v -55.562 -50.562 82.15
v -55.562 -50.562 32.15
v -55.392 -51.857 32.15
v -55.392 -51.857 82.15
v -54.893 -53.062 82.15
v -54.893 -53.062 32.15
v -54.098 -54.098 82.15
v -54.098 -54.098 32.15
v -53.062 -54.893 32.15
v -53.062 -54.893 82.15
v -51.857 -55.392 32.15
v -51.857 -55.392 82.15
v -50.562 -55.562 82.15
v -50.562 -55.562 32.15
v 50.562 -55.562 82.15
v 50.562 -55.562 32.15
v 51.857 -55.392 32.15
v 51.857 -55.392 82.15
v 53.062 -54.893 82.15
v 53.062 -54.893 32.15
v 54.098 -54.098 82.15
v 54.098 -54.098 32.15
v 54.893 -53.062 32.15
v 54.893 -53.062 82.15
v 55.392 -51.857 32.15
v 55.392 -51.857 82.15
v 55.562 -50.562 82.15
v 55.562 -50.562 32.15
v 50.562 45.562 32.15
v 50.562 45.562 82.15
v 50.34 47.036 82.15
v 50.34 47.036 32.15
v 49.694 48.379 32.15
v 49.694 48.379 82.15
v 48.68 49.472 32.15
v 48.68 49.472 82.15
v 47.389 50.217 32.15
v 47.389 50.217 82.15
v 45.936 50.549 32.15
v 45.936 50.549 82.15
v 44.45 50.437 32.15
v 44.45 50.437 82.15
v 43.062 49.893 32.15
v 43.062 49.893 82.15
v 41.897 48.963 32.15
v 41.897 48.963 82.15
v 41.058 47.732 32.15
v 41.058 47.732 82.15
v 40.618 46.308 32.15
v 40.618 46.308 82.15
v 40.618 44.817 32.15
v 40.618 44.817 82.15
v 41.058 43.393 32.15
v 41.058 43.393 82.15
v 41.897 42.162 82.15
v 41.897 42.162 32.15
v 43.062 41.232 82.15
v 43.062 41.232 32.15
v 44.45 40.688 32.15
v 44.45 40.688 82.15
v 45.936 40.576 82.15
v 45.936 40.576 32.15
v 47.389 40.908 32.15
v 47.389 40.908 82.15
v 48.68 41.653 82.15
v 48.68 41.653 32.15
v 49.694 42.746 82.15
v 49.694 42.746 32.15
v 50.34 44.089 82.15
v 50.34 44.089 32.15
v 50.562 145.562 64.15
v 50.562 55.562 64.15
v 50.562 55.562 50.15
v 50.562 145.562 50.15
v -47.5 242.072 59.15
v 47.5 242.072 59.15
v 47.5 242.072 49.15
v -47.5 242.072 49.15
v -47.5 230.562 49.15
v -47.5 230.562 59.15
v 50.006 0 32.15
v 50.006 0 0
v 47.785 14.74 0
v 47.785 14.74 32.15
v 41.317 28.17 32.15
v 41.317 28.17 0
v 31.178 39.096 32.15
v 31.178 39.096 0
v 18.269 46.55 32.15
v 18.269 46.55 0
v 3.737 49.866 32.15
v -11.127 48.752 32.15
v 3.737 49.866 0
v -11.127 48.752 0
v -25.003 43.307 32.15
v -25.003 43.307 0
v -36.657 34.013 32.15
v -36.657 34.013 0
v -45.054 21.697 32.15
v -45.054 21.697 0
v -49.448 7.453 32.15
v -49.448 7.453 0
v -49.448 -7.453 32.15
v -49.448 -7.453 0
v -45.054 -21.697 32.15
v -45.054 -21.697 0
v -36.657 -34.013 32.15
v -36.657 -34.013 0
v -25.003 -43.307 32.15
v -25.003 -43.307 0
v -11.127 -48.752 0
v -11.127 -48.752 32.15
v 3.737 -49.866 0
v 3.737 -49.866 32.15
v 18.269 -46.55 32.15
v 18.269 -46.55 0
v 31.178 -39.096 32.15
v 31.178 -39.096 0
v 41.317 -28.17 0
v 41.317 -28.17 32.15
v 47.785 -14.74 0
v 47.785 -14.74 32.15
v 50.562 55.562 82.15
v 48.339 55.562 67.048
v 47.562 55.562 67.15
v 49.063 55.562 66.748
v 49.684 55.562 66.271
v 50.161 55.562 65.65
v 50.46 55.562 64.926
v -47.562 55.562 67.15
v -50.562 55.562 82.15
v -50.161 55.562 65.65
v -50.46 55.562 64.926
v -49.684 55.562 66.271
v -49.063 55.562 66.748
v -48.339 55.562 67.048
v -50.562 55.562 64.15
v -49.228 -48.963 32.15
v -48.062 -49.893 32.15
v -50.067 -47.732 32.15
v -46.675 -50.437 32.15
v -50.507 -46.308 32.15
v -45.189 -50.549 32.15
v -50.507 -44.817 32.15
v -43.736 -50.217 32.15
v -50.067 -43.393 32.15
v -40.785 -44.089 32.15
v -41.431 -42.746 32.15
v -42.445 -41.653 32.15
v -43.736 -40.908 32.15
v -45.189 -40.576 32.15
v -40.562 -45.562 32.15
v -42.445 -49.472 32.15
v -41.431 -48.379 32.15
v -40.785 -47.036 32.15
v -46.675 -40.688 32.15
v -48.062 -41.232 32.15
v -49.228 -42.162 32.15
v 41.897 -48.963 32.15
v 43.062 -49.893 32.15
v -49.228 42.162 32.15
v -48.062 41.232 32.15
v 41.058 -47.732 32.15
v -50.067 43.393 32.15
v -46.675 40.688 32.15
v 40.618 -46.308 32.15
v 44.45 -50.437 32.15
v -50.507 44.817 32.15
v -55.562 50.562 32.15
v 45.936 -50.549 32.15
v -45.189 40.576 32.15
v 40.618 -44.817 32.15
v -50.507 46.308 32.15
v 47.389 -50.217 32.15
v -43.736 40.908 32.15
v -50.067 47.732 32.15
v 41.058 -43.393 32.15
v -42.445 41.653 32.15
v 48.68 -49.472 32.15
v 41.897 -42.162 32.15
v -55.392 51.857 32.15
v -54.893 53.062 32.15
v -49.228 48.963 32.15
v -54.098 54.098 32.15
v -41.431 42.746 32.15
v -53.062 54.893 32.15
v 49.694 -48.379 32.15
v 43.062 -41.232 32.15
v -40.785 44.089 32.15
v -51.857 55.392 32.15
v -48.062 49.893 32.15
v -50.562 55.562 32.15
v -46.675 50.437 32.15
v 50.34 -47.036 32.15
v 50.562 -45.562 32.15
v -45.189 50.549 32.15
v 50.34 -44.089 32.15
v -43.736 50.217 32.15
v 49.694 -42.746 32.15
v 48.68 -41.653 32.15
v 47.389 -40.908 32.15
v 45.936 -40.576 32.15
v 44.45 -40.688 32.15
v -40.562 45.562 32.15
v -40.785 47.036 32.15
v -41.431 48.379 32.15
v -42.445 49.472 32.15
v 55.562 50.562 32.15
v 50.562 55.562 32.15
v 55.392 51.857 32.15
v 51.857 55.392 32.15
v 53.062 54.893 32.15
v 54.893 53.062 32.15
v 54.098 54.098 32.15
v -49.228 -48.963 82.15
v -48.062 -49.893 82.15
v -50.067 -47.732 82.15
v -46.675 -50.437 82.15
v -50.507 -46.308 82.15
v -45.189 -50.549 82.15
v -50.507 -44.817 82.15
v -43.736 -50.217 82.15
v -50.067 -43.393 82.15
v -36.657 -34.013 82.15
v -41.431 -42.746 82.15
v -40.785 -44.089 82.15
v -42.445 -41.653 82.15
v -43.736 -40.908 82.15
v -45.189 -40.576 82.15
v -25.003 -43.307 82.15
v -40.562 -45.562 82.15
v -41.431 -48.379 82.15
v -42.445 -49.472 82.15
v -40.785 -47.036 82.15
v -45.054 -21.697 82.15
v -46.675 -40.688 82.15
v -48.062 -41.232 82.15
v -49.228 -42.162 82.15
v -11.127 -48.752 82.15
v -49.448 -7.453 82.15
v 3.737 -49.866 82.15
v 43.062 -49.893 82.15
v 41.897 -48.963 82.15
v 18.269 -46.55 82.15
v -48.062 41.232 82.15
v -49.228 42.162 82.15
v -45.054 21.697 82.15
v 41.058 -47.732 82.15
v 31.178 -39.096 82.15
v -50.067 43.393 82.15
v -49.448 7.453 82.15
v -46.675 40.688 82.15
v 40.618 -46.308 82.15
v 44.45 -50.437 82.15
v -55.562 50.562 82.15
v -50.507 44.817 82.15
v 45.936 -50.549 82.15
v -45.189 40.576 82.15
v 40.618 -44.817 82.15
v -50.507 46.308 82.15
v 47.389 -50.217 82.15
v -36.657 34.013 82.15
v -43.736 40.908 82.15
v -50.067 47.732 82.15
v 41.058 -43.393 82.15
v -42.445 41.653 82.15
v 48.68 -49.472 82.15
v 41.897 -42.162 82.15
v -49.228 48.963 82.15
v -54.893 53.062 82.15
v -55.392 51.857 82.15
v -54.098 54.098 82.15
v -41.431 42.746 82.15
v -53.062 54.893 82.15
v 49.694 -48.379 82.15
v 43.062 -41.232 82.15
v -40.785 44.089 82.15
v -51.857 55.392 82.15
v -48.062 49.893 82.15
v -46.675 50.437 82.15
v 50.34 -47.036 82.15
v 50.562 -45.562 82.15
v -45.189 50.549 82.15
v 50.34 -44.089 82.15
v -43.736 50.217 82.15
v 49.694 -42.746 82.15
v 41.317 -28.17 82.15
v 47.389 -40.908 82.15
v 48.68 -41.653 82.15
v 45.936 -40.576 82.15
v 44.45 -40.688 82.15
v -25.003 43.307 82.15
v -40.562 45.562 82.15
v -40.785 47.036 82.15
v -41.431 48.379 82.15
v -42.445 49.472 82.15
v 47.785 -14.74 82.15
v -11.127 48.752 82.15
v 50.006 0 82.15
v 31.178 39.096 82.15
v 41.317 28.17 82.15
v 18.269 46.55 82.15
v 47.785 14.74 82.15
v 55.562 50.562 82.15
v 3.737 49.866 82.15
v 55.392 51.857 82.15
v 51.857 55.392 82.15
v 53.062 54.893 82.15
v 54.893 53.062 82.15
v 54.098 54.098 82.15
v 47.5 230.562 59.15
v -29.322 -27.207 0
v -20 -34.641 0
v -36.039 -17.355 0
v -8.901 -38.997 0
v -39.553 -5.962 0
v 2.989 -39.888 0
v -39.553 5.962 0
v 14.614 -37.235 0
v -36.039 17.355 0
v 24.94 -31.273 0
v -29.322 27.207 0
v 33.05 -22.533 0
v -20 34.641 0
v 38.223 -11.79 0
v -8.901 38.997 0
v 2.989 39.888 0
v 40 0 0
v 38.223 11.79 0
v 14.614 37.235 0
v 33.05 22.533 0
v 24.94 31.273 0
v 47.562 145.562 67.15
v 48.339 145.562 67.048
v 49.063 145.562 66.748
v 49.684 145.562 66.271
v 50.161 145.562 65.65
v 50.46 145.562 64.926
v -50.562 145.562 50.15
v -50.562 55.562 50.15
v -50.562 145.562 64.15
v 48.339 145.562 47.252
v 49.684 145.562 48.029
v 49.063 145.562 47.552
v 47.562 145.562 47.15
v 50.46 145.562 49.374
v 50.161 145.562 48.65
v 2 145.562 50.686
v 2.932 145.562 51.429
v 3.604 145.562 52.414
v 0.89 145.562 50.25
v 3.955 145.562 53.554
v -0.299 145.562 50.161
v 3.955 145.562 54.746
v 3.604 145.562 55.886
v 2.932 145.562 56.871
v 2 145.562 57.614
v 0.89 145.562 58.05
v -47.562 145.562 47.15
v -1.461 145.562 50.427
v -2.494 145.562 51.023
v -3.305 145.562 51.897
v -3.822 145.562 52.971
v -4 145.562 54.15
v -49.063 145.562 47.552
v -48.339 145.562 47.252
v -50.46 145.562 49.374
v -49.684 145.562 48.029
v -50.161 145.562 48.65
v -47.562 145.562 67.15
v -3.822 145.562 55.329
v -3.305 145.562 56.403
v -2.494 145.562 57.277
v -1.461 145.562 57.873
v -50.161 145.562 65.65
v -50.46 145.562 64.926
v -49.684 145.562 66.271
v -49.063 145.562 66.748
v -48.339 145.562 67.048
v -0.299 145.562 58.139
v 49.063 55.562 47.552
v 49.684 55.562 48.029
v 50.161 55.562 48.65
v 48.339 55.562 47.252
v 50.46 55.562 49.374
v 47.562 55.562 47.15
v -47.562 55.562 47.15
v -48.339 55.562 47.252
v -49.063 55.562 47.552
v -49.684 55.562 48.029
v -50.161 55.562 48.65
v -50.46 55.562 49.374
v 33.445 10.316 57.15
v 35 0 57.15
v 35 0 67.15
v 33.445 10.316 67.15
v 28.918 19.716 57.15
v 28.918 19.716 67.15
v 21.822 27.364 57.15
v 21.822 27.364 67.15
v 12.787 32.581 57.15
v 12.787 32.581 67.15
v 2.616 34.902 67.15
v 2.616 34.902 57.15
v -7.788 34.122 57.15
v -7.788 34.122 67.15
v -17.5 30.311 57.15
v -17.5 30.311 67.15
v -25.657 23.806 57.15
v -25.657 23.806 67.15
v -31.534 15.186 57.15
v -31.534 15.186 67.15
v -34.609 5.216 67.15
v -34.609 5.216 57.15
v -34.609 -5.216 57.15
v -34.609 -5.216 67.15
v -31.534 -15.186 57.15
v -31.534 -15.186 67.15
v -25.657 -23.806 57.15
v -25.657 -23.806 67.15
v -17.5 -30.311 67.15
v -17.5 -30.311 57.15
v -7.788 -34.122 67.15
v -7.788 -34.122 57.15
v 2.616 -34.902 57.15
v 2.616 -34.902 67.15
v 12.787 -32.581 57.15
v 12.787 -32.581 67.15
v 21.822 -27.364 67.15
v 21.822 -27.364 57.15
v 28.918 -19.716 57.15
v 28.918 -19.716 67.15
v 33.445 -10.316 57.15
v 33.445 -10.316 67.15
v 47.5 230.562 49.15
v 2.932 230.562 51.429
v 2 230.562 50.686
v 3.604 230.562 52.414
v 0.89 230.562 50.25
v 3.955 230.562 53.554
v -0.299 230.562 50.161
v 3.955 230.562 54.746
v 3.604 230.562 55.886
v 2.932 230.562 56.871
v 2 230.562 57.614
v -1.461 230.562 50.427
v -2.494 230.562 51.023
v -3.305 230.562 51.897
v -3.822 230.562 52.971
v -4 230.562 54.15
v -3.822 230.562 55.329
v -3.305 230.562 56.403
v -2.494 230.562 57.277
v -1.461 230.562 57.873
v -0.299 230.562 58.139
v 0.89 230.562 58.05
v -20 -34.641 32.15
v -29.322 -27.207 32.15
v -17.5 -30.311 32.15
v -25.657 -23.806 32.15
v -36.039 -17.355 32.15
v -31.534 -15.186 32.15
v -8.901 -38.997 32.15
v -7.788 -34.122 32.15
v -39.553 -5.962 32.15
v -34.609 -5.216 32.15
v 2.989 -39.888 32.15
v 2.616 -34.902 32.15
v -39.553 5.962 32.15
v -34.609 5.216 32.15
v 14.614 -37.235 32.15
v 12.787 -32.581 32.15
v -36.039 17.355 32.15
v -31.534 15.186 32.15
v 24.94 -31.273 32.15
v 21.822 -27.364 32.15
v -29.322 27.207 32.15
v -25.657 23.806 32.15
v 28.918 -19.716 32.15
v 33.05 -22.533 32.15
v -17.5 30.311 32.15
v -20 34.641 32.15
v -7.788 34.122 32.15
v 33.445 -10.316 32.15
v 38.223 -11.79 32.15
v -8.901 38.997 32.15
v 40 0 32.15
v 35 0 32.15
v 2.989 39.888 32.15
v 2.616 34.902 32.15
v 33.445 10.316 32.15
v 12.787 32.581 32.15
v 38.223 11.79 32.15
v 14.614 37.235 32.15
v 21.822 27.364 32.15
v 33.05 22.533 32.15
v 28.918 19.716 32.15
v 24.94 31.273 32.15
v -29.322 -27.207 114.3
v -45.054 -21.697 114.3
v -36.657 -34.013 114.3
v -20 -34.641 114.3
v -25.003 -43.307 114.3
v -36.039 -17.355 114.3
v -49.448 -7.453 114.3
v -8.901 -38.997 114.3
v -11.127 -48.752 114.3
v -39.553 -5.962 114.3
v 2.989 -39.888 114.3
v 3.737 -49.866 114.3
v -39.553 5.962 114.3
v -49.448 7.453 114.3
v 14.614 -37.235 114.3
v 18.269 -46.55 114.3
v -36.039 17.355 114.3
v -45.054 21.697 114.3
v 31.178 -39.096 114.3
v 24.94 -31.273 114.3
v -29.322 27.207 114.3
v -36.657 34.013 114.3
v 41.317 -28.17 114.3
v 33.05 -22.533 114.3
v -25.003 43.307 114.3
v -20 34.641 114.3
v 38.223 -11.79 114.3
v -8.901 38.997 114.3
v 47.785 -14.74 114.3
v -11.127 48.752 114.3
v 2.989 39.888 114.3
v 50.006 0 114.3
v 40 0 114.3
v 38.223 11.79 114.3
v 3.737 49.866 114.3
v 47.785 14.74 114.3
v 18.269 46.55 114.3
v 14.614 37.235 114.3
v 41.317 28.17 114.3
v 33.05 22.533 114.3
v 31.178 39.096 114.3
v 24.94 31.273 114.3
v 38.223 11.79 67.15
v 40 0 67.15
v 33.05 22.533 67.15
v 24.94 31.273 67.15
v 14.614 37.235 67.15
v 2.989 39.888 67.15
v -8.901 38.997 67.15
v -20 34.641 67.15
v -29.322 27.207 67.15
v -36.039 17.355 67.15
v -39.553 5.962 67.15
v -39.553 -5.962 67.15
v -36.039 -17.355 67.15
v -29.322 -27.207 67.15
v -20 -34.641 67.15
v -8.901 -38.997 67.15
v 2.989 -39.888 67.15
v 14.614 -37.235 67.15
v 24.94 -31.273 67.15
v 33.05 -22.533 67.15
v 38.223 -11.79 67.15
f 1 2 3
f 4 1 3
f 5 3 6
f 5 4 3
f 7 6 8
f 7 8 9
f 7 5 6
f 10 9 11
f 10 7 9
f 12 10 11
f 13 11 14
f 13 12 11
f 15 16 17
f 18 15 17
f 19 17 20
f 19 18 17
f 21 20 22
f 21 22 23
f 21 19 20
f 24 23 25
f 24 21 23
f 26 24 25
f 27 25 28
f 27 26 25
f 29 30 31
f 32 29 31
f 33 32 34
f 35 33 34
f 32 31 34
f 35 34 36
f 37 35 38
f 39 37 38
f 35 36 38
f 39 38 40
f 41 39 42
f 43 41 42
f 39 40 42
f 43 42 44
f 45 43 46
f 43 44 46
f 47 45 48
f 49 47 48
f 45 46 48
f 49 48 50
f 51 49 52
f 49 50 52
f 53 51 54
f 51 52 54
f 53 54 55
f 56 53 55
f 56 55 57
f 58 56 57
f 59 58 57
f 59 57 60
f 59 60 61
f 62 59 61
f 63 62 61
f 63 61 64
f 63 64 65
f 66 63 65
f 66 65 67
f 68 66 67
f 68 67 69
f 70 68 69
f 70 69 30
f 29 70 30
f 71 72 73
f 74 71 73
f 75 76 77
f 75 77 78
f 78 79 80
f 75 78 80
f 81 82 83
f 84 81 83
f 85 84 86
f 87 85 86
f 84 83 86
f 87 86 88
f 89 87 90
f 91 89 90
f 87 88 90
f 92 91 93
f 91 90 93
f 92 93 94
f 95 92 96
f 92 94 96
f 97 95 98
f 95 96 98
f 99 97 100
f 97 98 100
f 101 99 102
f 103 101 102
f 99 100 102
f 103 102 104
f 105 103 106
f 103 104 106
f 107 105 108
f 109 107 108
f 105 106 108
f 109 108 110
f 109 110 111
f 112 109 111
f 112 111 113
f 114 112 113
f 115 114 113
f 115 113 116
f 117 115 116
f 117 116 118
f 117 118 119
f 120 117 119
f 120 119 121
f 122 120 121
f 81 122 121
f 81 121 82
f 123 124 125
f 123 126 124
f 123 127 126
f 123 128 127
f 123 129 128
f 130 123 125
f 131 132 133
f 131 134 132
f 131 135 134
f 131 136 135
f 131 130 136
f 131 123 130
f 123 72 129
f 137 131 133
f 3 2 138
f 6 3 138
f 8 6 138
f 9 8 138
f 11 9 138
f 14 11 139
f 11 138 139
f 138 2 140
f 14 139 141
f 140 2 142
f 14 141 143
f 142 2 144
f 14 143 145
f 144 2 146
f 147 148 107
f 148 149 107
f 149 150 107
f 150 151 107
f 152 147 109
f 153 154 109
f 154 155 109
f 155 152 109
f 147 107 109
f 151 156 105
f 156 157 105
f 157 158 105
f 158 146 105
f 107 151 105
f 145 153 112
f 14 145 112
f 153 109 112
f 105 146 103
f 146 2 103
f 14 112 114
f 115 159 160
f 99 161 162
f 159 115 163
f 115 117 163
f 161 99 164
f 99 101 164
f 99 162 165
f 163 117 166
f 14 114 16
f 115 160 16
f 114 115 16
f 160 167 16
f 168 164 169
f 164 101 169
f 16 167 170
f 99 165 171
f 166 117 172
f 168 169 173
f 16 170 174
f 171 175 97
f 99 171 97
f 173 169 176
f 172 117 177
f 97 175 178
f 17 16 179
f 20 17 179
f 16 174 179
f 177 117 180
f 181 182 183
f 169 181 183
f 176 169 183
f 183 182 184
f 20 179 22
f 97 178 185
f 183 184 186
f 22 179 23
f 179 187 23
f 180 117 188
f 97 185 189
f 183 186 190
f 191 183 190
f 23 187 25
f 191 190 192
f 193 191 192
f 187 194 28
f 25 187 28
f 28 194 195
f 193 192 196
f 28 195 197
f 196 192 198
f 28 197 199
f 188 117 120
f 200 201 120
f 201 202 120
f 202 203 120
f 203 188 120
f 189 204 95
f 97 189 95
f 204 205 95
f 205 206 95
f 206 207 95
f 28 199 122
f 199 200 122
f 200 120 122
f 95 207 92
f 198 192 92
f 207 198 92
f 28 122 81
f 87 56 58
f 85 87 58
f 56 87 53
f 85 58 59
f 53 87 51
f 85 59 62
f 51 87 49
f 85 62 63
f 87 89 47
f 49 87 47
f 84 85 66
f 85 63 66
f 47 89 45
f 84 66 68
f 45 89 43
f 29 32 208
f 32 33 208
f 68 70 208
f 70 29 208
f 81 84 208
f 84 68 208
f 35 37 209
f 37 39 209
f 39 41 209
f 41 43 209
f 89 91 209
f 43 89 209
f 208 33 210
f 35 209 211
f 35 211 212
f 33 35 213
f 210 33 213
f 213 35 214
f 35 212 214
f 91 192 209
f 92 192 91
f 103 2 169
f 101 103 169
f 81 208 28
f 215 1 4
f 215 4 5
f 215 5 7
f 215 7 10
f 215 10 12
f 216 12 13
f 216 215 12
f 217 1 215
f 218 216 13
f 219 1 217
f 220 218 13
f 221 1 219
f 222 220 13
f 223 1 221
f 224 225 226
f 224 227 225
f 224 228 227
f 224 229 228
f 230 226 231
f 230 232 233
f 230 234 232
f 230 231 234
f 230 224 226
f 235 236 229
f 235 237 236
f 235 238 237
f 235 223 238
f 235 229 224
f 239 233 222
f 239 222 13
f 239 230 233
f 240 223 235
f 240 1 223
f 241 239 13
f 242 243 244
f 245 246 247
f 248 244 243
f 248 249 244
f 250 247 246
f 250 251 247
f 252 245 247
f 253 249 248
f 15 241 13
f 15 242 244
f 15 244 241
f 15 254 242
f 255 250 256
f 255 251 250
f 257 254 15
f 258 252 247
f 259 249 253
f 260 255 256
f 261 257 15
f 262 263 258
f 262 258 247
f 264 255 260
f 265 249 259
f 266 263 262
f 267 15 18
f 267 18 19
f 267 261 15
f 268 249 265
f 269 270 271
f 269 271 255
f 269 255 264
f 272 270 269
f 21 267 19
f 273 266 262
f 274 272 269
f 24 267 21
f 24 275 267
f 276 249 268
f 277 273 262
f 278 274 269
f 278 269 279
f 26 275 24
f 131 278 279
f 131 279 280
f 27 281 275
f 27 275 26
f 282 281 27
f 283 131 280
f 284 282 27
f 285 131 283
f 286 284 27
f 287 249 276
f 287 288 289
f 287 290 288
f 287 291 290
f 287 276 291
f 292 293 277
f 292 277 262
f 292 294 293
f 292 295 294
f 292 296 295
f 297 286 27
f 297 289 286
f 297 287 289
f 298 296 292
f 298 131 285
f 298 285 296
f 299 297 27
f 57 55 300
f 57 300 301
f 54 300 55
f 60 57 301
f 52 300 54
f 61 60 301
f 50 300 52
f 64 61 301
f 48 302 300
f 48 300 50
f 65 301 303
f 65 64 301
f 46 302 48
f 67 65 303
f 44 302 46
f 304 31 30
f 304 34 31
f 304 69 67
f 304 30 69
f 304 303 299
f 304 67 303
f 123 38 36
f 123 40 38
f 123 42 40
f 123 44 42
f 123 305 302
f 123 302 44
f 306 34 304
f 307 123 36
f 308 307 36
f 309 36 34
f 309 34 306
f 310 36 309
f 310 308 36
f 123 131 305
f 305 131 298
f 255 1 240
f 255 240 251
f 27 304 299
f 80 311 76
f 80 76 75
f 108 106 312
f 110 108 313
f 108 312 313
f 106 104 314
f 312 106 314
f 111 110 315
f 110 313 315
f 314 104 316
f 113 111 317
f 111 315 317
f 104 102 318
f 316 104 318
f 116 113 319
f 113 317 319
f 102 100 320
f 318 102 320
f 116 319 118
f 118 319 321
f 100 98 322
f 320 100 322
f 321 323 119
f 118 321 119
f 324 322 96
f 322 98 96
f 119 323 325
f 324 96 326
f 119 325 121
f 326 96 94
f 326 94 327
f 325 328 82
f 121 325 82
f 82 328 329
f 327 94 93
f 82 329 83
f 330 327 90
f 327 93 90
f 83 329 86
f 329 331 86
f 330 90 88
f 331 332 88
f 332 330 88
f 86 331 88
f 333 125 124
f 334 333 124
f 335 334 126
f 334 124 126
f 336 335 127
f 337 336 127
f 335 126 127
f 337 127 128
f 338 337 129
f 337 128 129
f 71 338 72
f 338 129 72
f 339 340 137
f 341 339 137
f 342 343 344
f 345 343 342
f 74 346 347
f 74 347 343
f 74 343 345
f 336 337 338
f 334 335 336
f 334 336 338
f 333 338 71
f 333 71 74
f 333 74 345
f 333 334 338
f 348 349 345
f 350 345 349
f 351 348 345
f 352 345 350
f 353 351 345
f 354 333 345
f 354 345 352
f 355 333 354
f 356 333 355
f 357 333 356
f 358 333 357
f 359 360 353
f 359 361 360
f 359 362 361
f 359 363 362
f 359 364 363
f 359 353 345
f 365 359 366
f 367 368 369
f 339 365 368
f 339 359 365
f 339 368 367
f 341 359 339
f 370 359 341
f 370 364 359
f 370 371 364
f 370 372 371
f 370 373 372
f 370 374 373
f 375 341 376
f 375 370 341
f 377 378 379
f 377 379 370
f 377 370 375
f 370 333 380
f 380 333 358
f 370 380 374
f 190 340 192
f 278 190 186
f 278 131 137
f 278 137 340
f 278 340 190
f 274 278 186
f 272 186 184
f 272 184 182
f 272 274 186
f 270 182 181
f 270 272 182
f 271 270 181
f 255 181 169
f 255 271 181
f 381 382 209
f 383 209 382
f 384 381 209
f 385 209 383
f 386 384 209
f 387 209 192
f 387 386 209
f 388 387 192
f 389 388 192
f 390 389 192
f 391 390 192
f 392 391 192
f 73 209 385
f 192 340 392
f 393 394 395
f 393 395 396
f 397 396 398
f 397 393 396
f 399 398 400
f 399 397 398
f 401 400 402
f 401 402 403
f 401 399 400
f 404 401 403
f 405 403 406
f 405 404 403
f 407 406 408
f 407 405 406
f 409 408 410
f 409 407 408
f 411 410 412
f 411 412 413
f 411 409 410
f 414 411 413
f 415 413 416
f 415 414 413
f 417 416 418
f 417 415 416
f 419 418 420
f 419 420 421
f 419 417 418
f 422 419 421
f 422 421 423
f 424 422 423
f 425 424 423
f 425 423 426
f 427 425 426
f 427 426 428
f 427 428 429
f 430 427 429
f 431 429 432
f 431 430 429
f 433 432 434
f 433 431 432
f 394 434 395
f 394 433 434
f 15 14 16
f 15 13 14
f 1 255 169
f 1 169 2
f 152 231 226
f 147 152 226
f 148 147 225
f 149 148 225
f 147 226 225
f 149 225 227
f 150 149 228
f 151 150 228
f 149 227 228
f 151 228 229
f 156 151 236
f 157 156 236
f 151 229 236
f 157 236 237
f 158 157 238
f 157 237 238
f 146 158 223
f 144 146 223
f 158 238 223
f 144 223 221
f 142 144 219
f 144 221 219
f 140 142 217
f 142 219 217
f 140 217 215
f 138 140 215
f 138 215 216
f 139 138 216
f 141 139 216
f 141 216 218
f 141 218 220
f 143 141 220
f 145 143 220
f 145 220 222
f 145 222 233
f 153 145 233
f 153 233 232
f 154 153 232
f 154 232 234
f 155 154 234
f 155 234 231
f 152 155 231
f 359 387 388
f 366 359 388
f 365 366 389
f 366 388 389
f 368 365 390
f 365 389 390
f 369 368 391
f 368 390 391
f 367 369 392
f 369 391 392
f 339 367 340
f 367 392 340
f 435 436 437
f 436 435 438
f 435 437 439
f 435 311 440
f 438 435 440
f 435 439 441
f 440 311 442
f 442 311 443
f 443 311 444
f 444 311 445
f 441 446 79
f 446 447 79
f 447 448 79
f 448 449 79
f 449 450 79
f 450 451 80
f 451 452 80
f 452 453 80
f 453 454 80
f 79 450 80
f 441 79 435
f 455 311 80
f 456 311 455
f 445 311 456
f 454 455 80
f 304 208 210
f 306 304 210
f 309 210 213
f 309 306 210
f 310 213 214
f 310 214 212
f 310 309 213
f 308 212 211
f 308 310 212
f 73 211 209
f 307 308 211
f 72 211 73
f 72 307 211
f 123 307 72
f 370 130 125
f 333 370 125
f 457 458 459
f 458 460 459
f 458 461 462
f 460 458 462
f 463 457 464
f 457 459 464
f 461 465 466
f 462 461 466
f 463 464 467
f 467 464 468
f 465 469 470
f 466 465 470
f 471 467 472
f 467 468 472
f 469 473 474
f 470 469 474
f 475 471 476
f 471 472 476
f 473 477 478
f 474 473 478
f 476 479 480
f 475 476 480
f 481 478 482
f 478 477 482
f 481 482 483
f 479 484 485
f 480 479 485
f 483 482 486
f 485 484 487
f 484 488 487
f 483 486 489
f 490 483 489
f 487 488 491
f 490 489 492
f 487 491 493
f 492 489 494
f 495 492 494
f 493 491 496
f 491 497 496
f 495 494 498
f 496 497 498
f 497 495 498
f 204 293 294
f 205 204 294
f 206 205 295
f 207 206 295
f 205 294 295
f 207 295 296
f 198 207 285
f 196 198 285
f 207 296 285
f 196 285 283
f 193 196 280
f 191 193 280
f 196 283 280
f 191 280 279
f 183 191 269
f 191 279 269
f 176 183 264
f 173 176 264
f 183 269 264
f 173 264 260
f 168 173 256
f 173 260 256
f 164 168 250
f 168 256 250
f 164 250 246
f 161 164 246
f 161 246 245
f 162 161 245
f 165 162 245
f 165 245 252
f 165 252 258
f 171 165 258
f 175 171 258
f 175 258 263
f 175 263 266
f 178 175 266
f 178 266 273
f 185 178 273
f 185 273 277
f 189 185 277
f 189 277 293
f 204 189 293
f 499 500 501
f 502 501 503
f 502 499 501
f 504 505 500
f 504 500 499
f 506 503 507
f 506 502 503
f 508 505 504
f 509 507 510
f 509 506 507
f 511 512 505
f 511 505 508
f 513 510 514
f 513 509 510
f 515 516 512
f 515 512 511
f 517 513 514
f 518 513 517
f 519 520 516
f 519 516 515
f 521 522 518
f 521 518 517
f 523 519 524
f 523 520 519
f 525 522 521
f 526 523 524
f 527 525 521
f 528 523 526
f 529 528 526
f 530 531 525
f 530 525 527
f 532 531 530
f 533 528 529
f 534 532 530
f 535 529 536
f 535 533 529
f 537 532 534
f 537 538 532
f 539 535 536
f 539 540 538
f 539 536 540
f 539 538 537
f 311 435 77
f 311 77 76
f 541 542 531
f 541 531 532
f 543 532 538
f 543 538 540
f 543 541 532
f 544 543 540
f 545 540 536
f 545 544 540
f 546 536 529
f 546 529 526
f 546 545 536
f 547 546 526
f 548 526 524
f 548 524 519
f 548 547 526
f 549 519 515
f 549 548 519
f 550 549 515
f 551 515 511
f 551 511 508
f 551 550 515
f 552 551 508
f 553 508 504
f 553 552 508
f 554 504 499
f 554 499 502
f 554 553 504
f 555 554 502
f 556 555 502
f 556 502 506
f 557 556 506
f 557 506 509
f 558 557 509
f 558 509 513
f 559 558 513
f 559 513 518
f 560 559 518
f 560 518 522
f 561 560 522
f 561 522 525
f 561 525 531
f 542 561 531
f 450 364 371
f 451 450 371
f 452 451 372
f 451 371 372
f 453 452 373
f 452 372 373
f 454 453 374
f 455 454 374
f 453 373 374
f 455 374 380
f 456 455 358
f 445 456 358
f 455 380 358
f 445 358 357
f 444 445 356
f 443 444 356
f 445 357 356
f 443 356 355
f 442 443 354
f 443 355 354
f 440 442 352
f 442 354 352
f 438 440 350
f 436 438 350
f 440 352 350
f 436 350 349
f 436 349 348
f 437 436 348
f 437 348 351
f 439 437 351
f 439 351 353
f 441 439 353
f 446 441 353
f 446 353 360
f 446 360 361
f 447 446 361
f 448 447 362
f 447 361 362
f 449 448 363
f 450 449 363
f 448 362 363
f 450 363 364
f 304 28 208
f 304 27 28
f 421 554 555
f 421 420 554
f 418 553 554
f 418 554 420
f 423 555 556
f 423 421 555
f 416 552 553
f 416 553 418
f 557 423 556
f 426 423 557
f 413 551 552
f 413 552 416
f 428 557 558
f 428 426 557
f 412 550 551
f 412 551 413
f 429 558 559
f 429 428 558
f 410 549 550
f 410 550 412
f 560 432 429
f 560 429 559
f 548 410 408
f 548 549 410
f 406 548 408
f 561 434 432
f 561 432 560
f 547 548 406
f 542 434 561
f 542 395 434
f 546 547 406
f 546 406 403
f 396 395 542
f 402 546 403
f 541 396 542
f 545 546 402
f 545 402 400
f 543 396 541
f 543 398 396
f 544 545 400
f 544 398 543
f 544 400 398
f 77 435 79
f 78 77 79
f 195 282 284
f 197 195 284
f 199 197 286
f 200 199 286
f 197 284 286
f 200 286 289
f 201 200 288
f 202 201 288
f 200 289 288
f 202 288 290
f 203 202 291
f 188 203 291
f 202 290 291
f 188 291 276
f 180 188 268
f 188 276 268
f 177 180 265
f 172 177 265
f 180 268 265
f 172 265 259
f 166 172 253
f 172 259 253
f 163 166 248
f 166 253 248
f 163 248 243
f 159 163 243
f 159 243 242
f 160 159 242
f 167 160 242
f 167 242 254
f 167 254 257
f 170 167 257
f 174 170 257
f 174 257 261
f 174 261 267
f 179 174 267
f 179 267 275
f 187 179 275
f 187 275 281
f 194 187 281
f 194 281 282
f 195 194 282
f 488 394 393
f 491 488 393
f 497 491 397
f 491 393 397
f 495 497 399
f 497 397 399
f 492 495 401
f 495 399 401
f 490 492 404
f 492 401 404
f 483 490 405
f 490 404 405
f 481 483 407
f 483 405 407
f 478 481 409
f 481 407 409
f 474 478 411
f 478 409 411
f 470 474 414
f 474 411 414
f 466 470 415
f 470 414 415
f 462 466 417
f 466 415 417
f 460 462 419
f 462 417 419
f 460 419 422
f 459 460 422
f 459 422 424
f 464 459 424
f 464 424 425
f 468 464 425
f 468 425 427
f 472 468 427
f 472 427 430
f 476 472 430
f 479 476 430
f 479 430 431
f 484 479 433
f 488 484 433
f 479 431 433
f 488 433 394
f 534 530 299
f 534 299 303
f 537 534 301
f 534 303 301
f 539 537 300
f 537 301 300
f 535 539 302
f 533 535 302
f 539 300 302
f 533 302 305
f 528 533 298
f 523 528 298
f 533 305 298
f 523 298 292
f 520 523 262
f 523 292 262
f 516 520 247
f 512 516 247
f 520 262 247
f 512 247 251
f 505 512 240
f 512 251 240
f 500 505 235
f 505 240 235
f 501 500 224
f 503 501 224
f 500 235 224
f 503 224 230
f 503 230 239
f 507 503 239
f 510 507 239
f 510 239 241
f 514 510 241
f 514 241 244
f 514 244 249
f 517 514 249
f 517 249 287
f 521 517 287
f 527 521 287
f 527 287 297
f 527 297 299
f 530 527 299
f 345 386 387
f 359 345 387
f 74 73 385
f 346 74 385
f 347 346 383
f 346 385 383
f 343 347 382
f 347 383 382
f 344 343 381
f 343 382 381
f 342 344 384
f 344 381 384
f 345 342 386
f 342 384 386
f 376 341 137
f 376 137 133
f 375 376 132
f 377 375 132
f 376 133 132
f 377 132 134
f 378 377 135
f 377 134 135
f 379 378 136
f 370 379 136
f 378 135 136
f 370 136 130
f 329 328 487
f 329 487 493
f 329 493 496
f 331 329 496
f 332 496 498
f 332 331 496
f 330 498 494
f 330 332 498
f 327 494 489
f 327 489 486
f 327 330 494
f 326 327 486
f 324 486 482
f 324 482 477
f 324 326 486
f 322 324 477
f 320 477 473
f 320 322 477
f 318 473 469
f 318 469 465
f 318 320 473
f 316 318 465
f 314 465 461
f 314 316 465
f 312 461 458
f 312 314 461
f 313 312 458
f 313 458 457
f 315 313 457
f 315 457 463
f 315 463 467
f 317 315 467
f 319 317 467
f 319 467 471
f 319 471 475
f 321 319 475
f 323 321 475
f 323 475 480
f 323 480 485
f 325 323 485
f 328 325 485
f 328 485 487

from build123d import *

# Parameters (mm, degrees)
F0_R           = 50.00625
F0_R_2         = 40
F1_DEPTH       = 114.3
F3_R           = 50.00625
F4_DEPTH       = 25
F4_DEPTH_BACK  = 25
F5_R           = 5
F6_DEPTH       = 82.151
F8_DEPTH       = 90
F9_R           = 4
F10_DEPTH      = 85
F11_W          = 95
F11_H          = 10
F11_R          = 4
F12_DEPTH      = 11.51
F13_R          = 40
F13_R_2        = 35
F14_DEPTH      = 10
F14_DEPTH_BACK = 25


with BuildPart() as f1:
    # F0 (on Top) → F1 (new body)
    with BuildSketch(Plane.XY):
        Circle(F0_R)
        Circle(F0_R_2, mode=Mode.SUBTRACT)
    extrude(amount=F1_DEPTH)

    # F3 (on offset) → F4 (join, two sides)
    with BuildSketch(Plane.XY.offset(57.15)) as f4_sk:
        with BuildLine():
            ThreePointArc((55.5625, 50.5625), (54.0980339059, 54.0980339059), (50.5625, 55.5625))
            Line((50.5625, 55.5625), (-50.5625, 55.5625))
            ThreePointArc((-50.5625, 55.5625), (-54.0980339059, 54.0980339059), (-55.5625, 50.5625))
            Line((-55.5625, 50.5625), (-55.5625, -50.5625))
            ThreePointArc((-55.5625, -50.5625), (-54.0980339059, -54.0980339059), (-50.5625, -55.5625))
            Line((-50.5625, -55.5625), (50.5625, -55.5625))
            ThreePointArc((50.5625, -55.5625), (54.0980339059, -54.0980339059), (55.5625, -50.5625))
            Line((55.5625, -50.5625), (55.5625, 50.5625))
        make_face()
        Circle(F3_R, mode=Mode.SUBTRACT)
    extrude(amount=F4_DEPTH)
    extrude(f4_sk.sketch, amount=-F4_DEPTH_BACK)

    # F5 (on face) → F6 (cut, through all)
    with BuildSketch(Plane.XY.offset(82.15)):
        with Locations((-45.5625, 45.5625)):
            Circle(F5_R)
        with Locations((-45.5625, -45.5625)):
            Circle(F5_R)
        with Locations((45.5625, -45.5625)):
            Circle(F5_R)
        with Locations((45.5625, 45.5625)):
            Circle(F5_R)
    extrude(amount=-F6_DEPTH, mode=Mode.SUBTRACT)

    # F7 (on face) → F8 (join)
    with BuildSketch(Plane(origin=(0, 55.5625, 0), x_dir=(-1, 0, 0), z_dir=(0, 1, 0))):
        with BuildLine():
            Line((-47.5625, 47.15), (47.5625, 47.15))
            ThreePointArc((47.5625, 47.15), (49.6838203436, 48.0286796564), (50.5625, 50.15))
            Line((50.5625, 50.15), (50.5625, 64.15))
            ThreePointArc((50.5625, 64.15), (49.6838203436, 66.2713203436), (47.5625, 67.15))
            Line((47.5625, 67.15), (-47.5625, 67.15))
            ThreePointArc((-47.5625, 67.15), (-49.6838203436, 66.2713203436), (-50.5625, 64.15))
            Line((-50.5625, 64.15), (-50.5625, 50.15))
            ThreePointArc((-50.5625, 50.15), (-49.6838203436, 48.0286796564), (-47.5625, 47.15))
        make_face()
    extrude(amount=F8_DEPTH)

    # F9 (on face) → F10 (join)
    with BuildSketch(Plane(origin=(0, 145.5625, 0), x_dir=(-1, 0, 0), z_dir=(0, 1, 0))):
        with Locations((0, 54.15)):
            Circle(F9_R)
    extrude(amount=F10_DEPTH)

    # F11 (on face) → F12 (join)
    with BuildSketch(Plane(origin=(0, 230.5625, 0), x_dir=(-1, 0, 0), z_dir=(0, 1, 0))):
        with Locations((0, 54.15)):
            Rectangle(F11_W, F11_H)
        with Locations((0, 54.15)):
            Circle(F11_R, mode=Mode.SUBTRACT)
        with Locations((0, 54.15)):
            Circle(F11_R)
    extrude(amount=F12_DEPTH)

    # F13 (on offset) → F14 (join, two sides)
    with BuildSketch(Plane.XY.offset(57.15)) as f14_sk:
        Circle(F13_R)
        Circle(F13_R_2, mode=Mode.SUBTRACT)
    extrude(amount=F14_DEPTH)
    extrude(f14_sk.sketch, amount=-F14_DEPTH_BACK)


solid = f1.part
